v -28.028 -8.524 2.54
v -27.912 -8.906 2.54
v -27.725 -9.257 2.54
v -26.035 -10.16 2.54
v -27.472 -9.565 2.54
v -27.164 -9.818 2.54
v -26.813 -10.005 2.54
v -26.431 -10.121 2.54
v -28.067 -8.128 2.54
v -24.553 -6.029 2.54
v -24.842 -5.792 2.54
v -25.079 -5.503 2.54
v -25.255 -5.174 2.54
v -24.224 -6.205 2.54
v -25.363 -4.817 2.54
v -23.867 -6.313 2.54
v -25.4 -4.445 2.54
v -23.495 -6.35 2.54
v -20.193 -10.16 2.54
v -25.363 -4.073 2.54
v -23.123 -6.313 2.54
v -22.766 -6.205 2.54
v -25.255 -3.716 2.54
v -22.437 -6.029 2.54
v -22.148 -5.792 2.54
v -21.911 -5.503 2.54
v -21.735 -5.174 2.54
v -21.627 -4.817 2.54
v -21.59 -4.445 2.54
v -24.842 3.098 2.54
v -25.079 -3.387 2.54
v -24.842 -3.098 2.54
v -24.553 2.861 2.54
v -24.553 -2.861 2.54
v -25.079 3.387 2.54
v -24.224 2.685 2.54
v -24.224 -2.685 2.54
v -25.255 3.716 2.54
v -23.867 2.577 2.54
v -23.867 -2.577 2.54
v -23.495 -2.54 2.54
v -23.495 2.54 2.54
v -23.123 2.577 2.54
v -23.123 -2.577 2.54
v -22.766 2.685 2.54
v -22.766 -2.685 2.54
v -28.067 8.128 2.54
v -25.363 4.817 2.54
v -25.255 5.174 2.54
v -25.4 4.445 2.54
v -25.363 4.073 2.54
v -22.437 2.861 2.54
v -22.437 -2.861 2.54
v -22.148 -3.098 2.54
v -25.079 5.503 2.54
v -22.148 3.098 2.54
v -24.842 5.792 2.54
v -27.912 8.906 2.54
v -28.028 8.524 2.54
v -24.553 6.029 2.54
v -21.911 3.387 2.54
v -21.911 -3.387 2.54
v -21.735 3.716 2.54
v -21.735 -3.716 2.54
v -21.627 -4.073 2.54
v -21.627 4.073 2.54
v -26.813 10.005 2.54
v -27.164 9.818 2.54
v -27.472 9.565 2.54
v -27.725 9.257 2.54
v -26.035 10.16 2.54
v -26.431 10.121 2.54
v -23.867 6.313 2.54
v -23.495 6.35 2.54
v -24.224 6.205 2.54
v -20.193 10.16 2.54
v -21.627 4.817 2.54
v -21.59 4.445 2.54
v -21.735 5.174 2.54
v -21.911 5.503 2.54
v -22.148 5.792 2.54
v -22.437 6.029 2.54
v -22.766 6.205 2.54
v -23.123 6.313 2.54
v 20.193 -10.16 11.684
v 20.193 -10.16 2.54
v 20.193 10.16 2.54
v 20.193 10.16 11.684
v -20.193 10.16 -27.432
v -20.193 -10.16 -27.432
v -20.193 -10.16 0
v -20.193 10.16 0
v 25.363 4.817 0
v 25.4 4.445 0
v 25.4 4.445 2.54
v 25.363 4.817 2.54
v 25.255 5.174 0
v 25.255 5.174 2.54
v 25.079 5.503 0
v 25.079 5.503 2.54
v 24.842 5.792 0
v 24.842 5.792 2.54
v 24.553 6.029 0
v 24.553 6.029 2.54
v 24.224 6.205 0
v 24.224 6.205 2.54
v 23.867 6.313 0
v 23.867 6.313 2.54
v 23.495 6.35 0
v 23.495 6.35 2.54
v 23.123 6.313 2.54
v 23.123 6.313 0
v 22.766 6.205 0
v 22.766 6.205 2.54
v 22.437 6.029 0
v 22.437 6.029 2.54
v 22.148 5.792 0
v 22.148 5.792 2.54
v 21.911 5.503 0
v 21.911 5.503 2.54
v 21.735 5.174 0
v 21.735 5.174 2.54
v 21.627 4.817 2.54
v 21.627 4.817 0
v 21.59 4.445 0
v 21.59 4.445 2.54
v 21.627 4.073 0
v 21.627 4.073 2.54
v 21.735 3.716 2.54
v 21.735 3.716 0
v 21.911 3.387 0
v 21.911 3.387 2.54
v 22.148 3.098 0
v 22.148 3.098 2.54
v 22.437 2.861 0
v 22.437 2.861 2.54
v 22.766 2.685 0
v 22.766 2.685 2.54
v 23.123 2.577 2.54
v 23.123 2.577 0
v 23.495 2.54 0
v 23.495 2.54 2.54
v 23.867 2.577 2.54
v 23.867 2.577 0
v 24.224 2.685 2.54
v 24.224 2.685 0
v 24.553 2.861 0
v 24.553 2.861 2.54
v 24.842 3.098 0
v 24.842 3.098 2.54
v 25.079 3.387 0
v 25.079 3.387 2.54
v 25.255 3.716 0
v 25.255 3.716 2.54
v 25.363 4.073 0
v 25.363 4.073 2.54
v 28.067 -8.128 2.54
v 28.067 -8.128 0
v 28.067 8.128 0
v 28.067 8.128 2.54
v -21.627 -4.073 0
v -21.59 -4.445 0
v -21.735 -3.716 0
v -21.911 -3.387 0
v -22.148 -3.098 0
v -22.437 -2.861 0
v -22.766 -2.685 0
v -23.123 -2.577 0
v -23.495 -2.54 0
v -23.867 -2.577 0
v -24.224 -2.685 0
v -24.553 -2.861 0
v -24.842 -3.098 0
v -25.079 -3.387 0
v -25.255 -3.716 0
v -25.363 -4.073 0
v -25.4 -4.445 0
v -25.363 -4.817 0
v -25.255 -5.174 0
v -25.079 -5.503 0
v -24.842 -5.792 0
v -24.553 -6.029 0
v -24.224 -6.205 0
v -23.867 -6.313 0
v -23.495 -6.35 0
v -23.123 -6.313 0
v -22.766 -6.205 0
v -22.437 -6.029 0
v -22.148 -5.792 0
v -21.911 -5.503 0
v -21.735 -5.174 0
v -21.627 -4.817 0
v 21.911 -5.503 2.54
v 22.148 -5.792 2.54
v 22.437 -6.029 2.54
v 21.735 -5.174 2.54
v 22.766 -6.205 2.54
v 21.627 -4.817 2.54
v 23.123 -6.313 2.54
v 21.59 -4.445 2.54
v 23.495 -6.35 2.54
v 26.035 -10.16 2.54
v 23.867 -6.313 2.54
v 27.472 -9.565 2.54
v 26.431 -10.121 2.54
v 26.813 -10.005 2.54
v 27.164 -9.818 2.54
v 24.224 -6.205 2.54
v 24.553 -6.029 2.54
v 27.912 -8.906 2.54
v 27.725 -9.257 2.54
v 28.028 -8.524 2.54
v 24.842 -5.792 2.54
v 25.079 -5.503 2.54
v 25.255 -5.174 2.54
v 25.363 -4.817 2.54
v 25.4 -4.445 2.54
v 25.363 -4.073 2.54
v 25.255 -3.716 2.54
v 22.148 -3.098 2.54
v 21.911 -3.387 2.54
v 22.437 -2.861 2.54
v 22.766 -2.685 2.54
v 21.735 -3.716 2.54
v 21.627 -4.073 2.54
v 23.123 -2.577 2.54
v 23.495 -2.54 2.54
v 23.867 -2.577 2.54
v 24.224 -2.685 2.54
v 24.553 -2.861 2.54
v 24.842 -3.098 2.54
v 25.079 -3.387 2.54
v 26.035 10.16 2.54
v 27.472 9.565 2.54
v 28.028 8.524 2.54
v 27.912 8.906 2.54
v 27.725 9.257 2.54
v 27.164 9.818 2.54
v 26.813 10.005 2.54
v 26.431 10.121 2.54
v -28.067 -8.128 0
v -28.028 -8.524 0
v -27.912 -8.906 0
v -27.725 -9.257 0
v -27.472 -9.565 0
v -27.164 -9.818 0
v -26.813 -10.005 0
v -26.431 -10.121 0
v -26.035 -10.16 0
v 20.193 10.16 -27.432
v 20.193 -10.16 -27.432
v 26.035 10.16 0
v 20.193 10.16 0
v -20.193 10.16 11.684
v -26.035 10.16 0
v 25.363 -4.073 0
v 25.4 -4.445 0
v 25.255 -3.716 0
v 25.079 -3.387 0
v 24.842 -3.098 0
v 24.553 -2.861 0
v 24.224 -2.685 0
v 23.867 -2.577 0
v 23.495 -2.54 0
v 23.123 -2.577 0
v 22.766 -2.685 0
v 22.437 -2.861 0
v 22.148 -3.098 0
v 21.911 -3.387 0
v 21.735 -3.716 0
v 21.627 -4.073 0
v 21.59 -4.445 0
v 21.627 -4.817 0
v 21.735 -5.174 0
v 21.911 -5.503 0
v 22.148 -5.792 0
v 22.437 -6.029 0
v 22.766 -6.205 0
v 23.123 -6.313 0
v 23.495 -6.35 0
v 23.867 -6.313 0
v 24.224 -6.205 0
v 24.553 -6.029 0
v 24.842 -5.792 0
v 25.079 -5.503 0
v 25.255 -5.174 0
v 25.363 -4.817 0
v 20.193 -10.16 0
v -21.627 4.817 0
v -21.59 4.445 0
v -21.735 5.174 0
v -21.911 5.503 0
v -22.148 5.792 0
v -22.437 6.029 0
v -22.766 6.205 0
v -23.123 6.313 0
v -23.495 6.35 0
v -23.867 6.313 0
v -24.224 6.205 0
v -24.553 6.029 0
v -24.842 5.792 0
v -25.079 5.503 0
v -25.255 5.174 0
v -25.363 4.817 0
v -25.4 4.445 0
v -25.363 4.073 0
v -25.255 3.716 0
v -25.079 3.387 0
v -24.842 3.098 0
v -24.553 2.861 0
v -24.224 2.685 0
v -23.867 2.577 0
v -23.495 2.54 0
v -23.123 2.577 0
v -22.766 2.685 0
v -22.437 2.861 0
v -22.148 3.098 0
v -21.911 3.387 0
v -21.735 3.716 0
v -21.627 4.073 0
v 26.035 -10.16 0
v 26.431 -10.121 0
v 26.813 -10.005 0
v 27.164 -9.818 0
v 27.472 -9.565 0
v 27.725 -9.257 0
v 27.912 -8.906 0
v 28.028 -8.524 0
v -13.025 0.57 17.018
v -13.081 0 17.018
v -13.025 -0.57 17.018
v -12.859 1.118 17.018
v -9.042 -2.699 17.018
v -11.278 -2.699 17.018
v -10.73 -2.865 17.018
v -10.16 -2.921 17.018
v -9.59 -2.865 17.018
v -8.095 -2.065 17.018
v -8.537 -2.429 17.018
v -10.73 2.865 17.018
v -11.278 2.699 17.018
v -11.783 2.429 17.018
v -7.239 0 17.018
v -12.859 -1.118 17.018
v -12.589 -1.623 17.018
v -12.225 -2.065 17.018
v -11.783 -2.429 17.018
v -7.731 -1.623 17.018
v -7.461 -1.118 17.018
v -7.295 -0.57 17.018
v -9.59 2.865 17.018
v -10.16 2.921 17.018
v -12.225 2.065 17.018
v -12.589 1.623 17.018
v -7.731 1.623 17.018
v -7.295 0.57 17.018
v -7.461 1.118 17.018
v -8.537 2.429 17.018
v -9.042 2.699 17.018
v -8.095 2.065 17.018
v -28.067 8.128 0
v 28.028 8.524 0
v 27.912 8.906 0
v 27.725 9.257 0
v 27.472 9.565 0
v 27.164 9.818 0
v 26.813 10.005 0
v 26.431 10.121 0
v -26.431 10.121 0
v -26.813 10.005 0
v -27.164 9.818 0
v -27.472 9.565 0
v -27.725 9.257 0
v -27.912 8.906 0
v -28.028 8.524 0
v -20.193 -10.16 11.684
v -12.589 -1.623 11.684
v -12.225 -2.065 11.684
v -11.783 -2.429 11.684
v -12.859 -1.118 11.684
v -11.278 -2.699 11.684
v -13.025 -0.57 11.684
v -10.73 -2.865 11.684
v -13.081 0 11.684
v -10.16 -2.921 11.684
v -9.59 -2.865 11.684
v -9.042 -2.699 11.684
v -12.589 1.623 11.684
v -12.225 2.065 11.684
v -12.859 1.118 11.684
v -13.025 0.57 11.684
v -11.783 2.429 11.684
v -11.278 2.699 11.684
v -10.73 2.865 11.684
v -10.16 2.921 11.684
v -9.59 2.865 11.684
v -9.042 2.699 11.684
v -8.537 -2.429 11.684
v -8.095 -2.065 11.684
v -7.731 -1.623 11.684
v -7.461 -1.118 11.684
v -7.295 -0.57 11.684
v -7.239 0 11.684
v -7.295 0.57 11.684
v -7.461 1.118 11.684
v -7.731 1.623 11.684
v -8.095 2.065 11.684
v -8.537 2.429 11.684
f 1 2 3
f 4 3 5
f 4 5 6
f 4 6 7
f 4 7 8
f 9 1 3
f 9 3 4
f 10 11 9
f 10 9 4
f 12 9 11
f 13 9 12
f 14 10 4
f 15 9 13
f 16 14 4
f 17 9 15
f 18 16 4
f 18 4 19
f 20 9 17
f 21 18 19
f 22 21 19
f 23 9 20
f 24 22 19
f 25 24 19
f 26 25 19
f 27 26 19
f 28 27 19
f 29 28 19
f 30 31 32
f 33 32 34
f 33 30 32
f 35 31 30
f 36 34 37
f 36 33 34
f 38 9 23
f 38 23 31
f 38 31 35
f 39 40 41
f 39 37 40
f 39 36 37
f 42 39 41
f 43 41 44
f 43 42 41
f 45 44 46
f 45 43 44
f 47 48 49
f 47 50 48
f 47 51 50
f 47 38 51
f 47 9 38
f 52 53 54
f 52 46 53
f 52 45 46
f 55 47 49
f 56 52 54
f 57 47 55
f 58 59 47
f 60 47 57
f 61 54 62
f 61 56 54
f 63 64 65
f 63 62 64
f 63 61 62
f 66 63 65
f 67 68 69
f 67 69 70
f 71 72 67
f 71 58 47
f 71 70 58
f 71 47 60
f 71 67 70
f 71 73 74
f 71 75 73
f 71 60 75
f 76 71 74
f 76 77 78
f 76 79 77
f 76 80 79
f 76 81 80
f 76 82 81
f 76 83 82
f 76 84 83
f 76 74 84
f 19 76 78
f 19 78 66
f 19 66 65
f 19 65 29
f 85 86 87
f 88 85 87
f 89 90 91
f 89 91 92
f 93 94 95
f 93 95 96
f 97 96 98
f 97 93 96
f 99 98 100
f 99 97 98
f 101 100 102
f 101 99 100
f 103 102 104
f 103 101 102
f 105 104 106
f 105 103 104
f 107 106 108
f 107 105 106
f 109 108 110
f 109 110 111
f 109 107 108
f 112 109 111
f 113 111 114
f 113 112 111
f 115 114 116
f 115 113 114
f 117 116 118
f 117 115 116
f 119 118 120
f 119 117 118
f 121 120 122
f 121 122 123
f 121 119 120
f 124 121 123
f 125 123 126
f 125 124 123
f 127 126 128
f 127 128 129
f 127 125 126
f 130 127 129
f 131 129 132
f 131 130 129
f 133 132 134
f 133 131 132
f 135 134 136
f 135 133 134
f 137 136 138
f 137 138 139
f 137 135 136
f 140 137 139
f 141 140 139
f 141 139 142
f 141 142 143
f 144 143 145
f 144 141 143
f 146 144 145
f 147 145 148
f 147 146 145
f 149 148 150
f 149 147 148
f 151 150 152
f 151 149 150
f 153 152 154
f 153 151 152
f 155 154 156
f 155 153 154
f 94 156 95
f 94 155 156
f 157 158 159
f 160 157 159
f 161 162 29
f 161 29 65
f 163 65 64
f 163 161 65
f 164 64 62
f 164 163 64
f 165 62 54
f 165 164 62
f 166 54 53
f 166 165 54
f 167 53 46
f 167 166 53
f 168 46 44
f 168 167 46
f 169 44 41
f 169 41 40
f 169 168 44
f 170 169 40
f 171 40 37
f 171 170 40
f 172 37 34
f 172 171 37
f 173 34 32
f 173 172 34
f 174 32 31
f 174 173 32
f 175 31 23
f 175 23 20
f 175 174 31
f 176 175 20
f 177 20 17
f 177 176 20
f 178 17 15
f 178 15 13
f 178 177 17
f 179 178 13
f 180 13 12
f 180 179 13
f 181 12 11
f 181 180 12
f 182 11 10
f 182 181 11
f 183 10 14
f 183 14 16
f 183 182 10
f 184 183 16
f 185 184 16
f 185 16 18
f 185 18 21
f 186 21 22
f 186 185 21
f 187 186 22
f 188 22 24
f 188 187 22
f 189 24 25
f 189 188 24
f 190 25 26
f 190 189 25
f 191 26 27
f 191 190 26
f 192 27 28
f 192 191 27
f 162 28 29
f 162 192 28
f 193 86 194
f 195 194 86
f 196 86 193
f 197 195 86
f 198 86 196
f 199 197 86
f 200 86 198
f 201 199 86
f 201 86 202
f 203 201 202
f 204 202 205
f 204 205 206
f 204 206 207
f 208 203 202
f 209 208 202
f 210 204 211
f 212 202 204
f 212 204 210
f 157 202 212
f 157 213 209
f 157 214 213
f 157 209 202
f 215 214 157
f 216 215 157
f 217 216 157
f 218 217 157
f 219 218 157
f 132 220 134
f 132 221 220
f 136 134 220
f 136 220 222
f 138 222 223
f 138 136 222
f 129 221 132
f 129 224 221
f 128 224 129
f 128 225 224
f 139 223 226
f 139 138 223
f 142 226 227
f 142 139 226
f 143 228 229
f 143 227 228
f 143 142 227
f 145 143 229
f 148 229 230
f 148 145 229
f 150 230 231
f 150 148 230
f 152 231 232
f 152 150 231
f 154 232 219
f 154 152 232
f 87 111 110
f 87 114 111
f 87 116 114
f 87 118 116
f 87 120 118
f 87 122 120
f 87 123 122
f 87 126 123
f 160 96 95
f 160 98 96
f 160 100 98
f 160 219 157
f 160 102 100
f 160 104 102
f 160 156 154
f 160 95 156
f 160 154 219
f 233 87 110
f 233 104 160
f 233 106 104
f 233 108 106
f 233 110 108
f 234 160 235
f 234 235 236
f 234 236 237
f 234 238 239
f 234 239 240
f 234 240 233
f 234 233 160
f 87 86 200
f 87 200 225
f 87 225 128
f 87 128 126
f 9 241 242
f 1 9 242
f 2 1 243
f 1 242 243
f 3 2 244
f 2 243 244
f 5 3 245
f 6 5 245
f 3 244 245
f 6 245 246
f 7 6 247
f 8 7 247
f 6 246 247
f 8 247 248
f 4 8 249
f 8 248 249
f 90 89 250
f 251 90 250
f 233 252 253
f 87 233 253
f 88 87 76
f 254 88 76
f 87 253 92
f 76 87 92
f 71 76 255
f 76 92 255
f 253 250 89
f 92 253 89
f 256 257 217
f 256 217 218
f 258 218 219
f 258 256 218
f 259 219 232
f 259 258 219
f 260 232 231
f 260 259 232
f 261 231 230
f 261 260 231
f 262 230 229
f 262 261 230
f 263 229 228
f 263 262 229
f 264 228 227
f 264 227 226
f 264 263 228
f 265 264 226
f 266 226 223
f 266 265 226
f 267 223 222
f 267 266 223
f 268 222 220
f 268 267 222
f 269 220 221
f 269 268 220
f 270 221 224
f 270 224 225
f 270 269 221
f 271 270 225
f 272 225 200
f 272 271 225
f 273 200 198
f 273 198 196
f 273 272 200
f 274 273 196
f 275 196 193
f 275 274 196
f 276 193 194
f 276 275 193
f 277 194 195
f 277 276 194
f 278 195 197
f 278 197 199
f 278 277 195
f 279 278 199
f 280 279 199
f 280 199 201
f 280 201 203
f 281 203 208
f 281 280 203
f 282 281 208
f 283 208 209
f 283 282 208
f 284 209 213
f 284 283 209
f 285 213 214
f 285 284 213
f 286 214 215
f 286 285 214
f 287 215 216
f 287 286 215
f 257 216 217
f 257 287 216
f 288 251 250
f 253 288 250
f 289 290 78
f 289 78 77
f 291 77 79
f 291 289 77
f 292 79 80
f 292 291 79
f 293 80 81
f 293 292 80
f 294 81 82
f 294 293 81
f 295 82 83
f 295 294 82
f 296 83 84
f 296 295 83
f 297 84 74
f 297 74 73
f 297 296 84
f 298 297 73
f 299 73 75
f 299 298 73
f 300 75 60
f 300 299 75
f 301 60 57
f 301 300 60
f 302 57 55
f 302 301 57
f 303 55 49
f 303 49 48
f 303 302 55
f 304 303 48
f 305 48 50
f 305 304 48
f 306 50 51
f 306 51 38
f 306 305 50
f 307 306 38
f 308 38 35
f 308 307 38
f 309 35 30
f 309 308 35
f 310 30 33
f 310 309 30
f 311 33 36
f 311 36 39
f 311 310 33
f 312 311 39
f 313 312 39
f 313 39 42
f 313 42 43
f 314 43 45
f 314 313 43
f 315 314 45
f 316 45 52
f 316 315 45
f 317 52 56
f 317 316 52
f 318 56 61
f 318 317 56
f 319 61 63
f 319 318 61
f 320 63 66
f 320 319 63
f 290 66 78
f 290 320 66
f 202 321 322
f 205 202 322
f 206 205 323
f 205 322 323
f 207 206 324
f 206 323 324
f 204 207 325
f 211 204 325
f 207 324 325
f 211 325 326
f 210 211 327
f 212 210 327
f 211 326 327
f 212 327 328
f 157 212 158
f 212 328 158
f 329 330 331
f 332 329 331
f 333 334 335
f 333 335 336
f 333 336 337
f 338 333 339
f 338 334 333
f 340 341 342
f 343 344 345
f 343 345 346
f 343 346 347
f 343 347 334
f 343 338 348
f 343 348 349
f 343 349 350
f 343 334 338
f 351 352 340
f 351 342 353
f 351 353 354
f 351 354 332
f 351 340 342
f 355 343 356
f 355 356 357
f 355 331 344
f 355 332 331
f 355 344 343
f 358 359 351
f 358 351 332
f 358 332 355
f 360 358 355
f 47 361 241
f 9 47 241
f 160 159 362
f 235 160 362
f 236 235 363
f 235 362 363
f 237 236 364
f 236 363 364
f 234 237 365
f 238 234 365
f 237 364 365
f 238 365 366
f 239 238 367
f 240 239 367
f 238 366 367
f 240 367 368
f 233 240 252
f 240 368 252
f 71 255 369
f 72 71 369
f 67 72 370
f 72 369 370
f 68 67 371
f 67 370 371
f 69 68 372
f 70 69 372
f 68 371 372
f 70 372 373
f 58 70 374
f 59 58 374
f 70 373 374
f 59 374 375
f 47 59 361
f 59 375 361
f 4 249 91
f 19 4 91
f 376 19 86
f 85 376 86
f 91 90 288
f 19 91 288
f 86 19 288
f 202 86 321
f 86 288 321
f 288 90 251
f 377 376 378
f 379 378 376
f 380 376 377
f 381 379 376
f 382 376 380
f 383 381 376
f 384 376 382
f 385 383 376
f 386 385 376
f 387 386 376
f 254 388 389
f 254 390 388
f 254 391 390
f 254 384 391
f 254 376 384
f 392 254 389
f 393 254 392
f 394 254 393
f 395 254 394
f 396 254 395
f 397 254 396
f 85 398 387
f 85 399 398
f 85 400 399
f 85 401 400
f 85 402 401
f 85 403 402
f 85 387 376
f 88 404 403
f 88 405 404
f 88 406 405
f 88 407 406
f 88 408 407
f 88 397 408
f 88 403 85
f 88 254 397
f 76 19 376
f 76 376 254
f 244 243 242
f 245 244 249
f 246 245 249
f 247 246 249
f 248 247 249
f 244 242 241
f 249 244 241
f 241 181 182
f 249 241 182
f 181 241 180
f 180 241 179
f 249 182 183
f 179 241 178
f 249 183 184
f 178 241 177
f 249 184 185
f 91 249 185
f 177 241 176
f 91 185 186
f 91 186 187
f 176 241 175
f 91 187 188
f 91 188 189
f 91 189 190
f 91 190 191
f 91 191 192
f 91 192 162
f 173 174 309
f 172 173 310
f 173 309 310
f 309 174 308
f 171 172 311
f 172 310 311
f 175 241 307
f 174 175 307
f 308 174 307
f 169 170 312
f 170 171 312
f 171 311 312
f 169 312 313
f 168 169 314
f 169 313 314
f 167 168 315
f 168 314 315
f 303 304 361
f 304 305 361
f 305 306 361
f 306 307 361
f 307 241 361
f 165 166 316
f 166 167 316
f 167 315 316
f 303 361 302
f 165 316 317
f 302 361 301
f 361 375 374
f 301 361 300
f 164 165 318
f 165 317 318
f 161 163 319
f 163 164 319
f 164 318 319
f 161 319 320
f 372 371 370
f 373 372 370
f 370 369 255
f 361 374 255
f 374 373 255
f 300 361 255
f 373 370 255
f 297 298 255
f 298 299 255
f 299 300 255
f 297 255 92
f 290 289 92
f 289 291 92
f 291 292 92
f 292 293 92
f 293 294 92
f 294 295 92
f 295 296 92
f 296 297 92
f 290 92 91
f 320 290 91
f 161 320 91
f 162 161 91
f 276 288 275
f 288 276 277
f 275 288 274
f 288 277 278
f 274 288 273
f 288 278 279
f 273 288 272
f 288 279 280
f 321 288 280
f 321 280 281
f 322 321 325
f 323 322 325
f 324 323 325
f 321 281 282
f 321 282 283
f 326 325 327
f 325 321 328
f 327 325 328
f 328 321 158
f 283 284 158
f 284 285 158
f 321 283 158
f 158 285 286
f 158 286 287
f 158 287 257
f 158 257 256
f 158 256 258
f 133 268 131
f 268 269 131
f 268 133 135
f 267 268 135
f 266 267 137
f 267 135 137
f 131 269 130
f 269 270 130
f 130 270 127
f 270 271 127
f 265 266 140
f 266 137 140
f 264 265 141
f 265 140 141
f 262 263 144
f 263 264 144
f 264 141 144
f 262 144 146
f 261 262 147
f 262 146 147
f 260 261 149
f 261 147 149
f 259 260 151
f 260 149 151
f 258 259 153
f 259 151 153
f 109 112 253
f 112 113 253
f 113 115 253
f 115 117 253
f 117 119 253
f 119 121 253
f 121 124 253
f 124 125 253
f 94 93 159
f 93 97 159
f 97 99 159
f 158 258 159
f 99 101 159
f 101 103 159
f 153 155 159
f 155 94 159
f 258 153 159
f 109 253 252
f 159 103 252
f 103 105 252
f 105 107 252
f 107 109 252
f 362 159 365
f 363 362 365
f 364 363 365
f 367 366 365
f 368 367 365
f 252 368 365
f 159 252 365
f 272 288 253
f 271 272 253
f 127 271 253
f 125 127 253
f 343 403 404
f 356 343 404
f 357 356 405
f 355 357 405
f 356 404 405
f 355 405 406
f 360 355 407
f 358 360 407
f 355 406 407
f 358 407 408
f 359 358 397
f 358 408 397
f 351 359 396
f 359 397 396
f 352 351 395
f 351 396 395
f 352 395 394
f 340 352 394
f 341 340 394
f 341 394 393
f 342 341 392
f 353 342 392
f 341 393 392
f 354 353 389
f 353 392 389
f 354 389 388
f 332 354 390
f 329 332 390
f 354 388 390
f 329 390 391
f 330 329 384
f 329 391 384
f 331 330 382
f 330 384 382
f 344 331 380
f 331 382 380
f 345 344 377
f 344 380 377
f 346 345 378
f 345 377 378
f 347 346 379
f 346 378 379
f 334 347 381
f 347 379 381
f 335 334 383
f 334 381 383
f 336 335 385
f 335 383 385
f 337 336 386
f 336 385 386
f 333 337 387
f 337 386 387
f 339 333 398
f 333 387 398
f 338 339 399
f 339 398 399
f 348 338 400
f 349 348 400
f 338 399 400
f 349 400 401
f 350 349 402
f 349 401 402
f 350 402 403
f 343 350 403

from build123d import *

# Parameters (mm, degrees)
F0_W          = 40.386
F0_H          = 20.32
F1_DEPTH      = 27.432
F1_DEPTH_BACK = 11.684
F2_R          = 1.905
F3_DEPTH      = 2.54
F4_R          = 2.921
F5_DEPTH      = 5.334


with BuildPart() as f1:
    # F0 (on Top) → F1 (new body, two sides)
    with BuildSketch(Plane.XY) as f1_sk:
        Rectangle(F0_W, F0_H)
    extrude(amount=-F1_DEPTH)
    extrude(f1_sk.sketch, amount=F1_DEPTH_BACK)

    # F2 (on Top) → F3 (join)
    with BuildSketch(Plane.XY):
        with BuildLine():
            Line((26.035, 10.16), (-26.035, 10.16))
            ThreePointArc((-26.035, 10.16), (-27.4718409794, 9.5648409794), (-28.067, 8.128))
            Line((-28.067, 8.128), (-28.067, -8.128))
            ThreePointArc((-28.067, -8.128), (-27.4718409794, -9.5648409794), (-26.035, -10.16))
            Line((-26.035, -10.16), (26.035, -10.16))
            ThreePointArc((26.035, -10.16), (27.4718409794, -9.5648409794), (28.067, -8.128))
            Line((28.067, -8.128), (28.067, 8.128))
            ThreePointArc((28.067, 8.128), (27.4718409794, 9.5648409794), (26.035, 10.16))
        make_face()
        with Locations((-23.495, -4.445)):
            Circle(F2_R, mode=Mode.SUBTRACT)
        with Locations((23.495, -4.445)):
            Circle(F2_R, mode=Mode.SUBTRACT)
        with Locations((-23.495, 4.445)):
            Circle(F2_R, mode=Mode.SUBTRACT)
        with Locations((23.495, 4.445)):
            Circle(F2_R, mode=Mode.SUBTRACT)
    extrude(amount=F3_DEPTH)

    # F4 (on face) → F5 (join)
    with BuildSketch(Plane.XY.offset(11.684)):
        with Locations((-10.16, 0)):
            Circle(F4_R)
    extrude(amount=F5_DEPTH)


solid = f1.part
